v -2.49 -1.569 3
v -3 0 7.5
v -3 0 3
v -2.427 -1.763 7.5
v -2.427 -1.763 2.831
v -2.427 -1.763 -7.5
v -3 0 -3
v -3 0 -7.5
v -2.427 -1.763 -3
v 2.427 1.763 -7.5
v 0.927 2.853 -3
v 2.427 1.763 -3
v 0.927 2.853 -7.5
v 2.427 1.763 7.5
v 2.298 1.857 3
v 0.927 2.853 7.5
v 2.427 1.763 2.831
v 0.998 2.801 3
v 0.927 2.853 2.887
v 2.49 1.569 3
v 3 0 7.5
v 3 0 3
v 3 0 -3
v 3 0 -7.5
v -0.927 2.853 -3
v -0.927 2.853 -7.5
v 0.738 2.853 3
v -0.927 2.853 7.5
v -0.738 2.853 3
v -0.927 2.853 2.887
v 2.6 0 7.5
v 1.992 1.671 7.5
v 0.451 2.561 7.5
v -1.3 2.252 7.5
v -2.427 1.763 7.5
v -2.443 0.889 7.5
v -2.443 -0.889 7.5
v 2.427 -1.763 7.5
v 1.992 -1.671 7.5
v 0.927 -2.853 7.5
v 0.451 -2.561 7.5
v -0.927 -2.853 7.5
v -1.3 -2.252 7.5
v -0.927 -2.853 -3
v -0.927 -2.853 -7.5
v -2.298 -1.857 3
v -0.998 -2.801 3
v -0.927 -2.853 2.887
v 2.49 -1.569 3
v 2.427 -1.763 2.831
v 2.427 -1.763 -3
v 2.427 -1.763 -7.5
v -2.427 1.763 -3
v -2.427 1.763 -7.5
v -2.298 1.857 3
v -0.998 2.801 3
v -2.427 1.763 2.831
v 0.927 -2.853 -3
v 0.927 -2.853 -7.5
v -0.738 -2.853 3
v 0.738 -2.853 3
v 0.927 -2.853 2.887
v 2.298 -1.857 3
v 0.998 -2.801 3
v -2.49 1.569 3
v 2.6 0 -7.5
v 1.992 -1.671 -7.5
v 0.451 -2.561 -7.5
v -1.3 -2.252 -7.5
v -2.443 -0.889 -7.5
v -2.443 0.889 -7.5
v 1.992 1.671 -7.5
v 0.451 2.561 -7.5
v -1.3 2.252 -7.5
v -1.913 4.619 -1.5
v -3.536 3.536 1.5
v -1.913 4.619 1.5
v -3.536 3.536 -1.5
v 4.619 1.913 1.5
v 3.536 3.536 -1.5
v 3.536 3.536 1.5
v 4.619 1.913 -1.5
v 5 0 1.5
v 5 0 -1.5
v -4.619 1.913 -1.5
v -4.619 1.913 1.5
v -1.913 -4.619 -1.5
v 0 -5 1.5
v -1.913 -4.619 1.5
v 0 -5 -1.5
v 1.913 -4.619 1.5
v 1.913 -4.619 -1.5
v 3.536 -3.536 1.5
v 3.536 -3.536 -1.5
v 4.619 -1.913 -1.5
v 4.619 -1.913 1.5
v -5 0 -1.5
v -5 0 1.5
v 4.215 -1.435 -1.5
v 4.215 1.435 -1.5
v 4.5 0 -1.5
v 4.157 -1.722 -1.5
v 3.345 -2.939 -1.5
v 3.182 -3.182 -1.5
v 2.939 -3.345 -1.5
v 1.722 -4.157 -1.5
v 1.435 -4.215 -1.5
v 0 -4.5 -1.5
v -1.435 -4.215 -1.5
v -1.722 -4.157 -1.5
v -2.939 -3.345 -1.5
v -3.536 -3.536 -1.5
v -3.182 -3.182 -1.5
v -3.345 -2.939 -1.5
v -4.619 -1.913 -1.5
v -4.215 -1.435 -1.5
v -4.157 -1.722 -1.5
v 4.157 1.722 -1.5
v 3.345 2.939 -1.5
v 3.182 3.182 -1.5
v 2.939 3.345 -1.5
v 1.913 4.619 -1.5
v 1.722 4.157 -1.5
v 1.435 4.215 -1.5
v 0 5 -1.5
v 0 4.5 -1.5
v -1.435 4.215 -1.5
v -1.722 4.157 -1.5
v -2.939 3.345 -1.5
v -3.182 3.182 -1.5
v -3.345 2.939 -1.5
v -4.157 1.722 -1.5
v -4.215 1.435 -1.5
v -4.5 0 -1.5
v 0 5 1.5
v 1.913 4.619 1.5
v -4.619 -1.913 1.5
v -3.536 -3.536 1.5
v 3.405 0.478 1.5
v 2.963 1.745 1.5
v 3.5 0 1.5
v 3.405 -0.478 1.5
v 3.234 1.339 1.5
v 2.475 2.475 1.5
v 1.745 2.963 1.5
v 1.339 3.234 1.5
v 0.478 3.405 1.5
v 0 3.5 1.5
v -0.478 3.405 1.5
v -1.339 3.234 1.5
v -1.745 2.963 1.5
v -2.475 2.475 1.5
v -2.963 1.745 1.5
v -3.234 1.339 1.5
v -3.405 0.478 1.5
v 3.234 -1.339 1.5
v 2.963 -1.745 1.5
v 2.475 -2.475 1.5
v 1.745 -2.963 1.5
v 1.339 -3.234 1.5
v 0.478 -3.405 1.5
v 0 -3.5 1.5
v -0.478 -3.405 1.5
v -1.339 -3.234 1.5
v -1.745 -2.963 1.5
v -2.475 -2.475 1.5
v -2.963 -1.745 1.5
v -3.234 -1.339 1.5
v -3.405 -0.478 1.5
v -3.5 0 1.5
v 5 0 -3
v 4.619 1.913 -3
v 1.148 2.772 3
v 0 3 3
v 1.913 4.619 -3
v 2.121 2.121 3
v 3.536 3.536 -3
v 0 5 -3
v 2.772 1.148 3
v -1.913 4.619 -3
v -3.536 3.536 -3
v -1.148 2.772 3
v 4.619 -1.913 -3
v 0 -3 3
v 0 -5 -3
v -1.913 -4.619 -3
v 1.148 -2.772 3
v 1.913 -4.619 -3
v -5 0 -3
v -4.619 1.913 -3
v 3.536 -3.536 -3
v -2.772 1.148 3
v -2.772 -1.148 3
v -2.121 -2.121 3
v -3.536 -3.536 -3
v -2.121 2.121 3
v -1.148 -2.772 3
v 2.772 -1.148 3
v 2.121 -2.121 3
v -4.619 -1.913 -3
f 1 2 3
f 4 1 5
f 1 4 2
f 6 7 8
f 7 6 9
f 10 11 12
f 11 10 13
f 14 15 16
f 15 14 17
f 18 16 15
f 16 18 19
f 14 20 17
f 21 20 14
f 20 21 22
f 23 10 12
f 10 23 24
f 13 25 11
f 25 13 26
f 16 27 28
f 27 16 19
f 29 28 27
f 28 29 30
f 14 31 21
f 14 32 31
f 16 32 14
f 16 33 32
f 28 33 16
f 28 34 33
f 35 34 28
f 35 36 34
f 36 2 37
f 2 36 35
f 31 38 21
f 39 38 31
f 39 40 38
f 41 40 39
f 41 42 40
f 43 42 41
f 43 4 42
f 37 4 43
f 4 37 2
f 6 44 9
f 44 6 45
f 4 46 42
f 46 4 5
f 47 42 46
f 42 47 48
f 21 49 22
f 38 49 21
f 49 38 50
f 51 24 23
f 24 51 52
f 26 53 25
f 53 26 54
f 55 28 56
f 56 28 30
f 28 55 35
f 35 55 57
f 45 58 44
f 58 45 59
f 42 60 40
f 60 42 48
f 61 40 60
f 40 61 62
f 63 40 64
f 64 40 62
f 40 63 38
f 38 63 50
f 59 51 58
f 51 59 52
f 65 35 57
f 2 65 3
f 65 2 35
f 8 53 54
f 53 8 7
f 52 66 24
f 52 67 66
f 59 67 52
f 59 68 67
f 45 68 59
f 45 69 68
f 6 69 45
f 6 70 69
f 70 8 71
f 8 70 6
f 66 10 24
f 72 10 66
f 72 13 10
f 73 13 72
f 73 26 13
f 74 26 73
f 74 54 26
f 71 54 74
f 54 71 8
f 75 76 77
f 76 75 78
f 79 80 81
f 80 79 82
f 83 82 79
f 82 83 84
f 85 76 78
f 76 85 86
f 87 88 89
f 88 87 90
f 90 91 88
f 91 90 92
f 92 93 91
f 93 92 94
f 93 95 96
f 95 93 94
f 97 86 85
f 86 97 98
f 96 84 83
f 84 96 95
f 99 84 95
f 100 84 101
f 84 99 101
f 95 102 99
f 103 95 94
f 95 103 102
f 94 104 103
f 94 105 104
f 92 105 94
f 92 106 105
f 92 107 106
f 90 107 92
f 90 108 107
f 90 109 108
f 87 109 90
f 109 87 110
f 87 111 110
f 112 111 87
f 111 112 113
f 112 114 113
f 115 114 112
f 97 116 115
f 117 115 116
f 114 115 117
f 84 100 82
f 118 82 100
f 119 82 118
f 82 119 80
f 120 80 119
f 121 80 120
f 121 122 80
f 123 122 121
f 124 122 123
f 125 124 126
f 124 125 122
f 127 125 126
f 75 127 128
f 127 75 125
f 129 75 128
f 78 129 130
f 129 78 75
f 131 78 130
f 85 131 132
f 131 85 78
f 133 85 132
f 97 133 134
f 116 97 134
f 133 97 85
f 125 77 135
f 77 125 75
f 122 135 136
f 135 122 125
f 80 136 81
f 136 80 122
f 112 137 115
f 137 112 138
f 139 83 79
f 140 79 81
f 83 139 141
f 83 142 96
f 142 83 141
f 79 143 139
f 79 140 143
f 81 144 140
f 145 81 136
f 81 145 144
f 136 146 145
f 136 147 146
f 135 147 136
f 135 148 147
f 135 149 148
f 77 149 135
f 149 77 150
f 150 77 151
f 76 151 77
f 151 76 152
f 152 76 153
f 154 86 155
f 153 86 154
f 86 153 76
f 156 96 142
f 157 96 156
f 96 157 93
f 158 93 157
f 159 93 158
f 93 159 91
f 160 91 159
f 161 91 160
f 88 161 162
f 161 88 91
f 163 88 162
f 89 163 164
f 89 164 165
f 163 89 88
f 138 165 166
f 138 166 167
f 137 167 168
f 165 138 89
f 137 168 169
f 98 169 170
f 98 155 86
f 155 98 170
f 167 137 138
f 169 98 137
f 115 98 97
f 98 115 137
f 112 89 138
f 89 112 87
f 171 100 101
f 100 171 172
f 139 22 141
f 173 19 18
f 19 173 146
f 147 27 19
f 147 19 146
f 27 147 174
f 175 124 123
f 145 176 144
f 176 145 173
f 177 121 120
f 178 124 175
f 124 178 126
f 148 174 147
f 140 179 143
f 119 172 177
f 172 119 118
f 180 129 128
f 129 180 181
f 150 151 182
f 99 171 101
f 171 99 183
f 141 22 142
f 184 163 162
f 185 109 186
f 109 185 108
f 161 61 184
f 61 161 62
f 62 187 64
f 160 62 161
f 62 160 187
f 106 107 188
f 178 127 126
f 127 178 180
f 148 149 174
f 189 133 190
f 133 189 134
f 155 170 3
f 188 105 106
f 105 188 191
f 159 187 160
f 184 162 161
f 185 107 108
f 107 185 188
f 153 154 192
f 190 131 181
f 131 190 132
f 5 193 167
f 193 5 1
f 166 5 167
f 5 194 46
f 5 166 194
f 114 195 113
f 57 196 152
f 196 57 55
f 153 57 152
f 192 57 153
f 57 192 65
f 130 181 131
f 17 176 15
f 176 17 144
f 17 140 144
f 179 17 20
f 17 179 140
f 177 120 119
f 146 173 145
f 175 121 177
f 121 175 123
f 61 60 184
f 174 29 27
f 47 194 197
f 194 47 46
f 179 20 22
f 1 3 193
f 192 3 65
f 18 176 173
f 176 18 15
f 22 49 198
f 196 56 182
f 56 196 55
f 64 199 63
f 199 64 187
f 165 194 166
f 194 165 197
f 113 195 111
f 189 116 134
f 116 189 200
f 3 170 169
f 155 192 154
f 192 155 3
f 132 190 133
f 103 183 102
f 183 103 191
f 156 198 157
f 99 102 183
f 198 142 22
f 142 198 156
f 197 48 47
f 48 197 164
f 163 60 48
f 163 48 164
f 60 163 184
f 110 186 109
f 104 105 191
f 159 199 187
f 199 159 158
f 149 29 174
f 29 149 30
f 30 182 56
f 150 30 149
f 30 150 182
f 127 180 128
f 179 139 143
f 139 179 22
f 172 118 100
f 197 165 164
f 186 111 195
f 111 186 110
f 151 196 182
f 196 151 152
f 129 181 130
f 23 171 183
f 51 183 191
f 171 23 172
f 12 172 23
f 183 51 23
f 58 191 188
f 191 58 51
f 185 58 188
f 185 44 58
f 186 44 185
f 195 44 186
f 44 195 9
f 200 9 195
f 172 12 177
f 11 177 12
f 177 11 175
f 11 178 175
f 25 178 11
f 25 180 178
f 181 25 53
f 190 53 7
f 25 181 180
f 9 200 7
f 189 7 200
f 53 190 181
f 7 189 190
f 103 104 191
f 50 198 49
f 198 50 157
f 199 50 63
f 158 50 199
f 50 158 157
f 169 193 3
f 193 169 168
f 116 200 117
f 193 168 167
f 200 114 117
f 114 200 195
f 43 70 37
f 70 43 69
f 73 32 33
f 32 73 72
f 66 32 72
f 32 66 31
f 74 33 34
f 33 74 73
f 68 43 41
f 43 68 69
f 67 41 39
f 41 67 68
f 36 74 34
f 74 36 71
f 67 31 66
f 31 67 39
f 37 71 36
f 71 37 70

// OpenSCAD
// Simple trocar for laparoscopic trainer
// Author: Francesco Grondona

difference() {
    union() {
        cylinder(h=15, d=6, center=true);
        cylinder(h=3, d=10, center=true);
        cylinder(h=6, d1=10, d2=6, center=true);
    }
    cylinder(h=20, d=5.2, center=true);
}
